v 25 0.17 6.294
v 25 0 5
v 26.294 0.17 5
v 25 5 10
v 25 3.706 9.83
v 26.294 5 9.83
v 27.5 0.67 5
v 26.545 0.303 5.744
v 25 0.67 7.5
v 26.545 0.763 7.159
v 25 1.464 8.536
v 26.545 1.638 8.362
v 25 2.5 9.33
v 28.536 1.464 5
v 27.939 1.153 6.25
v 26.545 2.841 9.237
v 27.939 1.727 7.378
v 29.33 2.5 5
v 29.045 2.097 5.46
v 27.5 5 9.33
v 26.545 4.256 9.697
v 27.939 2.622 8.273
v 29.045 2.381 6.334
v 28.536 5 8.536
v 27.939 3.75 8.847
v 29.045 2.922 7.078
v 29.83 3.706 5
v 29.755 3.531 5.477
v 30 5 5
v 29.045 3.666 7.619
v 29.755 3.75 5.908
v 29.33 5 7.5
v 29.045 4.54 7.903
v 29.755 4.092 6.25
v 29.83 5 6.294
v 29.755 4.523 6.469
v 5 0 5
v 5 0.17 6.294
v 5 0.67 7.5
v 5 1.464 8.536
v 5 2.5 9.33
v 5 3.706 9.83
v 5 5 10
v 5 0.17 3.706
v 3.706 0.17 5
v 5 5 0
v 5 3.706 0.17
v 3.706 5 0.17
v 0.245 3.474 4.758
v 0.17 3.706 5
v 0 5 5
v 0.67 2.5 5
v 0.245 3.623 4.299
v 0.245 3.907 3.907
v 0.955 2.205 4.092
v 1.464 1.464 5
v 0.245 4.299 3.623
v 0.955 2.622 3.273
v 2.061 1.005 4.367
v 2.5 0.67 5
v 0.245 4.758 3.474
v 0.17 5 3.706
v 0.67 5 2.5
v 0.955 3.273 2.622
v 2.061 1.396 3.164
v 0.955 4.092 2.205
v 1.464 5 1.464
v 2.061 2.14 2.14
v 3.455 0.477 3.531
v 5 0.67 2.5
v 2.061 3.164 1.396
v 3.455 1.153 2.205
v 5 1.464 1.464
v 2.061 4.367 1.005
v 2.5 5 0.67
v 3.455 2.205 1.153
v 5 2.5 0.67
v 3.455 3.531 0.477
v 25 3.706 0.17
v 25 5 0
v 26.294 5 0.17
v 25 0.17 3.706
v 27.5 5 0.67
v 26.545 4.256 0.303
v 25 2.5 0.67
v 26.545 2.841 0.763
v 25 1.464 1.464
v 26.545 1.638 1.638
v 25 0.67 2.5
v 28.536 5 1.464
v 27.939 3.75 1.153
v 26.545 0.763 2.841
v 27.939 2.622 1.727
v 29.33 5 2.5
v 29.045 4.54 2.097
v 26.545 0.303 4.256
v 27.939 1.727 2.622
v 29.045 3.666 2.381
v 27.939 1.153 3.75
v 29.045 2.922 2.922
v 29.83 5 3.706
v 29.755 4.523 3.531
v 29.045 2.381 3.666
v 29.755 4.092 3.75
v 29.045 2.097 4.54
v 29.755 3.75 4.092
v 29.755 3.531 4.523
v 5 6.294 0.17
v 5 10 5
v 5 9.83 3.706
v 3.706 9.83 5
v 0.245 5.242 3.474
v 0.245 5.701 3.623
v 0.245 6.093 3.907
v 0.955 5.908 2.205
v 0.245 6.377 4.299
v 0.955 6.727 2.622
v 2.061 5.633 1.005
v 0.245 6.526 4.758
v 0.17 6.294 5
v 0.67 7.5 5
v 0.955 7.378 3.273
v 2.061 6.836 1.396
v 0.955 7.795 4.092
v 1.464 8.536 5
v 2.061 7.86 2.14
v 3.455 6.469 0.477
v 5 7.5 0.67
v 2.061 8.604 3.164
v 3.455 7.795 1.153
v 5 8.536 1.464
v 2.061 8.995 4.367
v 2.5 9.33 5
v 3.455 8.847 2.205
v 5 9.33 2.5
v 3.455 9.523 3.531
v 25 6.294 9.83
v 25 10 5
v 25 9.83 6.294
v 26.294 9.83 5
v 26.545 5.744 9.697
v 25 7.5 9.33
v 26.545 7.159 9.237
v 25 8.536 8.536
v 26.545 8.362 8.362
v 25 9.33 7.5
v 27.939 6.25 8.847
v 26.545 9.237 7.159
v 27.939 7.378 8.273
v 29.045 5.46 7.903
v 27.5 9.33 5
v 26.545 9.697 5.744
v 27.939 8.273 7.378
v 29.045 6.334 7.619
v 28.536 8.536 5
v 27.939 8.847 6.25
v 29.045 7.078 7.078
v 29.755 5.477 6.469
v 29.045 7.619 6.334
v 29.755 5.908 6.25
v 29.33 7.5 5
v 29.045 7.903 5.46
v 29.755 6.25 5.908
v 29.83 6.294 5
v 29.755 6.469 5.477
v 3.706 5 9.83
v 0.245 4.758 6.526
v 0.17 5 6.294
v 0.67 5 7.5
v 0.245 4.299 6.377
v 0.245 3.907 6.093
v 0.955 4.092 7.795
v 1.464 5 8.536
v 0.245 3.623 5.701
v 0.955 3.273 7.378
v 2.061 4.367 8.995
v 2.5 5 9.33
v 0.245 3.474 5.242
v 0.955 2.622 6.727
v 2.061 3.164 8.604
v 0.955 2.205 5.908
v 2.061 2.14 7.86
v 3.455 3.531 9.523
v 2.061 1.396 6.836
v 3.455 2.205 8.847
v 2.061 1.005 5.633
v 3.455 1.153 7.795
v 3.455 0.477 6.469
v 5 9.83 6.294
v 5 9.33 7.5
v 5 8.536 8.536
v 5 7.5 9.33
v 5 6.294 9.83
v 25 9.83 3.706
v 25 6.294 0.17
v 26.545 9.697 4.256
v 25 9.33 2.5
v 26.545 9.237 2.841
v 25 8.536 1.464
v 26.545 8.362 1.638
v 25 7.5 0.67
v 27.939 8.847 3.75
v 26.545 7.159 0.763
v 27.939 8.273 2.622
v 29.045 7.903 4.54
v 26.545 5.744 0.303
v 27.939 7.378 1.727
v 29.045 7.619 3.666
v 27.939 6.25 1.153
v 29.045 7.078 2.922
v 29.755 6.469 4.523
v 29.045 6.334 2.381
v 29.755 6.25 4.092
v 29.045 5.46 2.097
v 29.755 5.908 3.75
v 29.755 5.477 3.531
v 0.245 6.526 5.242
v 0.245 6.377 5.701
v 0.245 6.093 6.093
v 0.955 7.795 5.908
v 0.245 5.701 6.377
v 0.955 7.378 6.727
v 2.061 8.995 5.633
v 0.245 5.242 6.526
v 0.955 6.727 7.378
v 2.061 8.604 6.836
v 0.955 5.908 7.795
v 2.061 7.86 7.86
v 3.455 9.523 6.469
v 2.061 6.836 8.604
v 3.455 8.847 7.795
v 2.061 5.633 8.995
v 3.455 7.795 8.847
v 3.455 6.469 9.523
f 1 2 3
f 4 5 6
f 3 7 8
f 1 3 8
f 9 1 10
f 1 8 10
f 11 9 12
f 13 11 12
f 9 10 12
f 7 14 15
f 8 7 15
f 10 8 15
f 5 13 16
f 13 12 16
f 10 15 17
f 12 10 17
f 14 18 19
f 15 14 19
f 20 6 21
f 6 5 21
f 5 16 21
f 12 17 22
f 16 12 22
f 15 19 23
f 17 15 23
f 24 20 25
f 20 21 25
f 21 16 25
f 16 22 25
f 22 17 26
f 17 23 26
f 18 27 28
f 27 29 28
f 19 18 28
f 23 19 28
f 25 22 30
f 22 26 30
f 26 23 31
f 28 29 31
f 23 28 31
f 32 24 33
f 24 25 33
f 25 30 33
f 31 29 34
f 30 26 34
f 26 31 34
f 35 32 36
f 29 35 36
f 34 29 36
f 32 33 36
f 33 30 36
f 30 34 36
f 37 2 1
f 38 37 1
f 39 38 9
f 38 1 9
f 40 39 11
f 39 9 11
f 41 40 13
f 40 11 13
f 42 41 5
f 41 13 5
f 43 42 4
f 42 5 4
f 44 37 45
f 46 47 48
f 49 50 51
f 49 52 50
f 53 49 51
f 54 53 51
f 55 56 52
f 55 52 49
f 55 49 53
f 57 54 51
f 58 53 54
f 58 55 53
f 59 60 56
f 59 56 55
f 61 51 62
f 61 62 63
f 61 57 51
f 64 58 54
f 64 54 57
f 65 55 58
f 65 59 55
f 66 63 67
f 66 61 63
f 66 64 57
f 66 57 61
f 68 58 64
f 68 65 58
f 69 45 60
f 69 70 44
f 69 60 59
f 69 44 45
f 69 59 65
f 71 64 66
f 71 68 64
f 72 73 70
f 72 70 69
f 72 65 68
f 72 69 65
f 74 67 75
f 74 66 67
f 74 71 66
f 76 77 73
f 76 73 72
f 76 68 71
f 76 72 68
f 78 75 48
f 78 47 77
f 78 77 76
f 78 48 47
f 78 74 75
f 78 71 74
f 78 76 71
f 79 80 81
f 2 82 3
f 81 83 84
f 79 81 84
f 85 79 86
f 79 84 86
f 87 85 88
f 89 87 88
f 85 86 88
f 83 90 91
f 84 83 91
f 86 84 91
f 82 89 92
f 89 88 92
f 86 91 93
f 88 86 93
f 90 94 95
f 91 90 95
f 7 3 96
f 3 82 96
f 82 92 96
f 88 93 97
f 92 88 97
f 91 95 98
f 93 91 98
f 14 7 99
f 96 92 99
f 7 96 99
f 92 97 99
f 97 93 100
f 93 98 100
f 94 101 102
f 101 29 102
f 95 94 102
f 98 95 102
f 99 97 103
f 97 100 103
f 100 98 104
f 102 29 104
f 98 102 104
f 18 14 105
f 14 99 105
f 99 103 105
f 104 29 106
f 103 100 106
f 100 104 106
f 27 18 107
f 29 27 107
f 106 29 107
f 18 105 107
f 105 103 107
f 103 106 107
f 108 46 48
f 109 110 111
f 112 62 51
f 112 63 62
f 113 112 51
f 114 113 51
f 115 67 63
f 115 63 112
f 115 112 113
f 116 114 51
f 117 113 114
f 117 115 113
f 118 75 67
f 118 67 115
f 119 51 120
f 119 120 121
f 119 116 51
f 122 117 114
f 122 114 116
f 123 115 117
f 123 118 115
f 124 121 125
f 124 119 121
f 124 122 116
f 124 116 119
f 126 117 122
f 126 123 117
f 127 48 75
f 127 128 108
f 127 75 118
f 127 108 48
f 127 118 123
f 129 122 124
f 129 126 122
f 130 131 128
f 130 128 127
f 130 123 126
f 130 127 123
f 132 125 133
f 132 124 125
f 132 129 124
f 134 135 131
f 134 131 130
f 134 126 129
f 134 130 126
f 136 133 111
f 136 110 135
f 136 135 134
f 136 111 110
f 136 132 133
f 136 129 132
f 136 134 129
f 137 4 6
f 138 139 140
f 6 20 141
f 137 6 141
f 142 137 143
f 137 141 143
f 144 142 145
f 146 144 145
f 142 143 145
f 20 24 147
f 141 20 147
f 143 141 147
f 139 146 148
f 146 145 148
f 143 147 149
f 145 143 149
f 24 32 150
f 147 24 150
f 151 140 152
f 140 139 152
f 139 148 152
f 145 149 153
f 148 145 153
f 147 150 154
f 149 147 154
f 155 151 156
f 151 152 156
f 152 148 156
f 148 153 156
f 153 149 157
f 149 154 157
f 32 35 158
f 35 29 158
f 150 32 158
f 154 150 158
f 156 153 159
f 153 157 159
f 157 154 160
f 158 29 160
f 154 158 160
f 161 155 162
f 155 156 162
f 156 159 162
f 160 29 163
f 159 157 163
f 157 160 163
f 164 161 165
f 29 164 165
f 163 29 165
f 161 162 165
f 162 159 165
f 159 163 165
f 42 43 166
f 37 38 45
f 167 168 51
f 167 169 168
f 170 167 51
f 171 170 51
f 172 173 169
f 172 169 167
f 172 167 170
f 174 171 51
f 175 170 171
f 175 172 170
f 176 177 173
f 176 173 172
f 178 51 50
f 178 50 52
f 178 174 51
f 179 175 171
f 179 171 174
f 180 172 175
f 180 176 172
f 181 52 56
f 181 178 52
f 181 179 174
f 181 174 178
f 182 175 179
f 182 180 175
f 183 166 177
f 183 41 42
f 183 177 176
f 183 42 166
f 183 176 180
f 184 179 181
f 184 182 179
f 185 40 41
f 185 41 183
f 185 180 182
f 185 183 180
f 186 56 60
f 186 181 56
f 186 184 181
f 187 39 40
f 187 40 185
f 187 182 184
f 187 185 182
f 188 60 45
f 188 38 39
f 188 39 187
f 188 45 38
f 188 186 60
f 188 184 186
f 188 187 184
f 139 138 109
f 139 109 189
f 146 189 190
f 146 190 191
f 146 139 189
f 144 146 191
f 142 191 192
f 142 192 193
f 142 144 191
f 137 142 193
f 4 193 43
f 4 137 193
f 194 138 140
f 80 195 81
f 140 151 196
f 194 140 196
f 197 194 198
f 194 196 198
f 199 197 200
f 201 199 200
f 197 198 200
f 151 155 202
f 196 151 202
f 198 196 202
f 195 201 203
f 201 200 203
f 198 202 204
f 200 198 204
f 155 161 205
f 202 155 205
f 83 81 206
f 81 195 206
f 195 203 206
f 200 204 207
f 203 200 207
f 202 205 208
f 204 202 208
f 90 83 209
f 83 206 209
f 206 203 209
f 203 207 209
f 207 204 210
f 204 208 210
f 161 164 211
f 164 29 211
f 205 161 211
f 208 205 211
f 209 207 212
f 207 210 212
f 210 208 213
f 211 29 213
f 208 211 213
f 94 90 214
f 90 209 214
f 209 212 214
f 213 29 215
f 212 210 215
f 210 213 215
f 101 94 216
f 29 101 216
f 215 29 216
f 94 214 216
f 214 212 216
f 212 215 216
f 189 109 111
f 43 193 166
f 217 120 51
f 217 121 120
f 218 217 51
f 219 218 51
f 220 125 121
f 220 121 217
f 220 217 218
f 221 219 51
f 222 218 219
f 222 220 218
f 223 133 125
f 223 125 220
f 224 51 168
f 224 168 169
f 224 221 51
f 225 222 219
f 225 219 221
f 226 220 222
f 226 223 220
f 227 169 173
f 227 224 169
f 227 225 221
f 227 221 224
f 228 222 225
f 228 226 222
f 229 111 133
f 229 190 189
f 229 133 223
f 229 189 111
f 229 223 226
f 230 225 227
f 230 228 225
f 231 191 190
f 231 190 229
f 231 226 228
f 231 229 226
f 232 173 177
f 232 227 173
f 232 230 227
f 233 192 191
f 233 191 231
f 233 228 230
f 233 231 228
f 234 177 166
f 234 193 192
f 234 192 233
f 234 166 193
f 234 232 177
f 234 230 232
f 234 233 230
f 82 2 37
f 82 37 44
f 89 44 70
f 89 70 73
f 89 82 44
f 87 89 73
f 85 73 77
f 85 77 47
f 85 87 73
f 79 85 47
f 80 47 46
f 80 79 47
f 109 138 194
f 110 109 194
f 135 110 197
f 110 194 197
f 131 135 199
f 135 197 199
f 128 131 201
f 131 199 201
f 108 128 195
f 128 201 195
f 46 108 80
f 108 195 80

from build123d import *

# Parameters (mm, degrees)
F0_W     = 30
F0_H     = 10
F1_DEPTH = 10
F2_R     = 4.99999
F3_R     = 4.99999


# Not quite as in the source:
# - a fillet or chamfer is up to 0.001 mm smaller than in the source, because OpenCascade refuses the exact size


with BuildPart() as f1:
    # F0 (on Top) → F1 (new body)
    with BuildSketch(Plane.XY):
        with Locations((15, 5)):
            Rectangle(F0_W, F0_H)
    extrude(amount=F1_DEPTH)

    # F2 (radius 5 in the source; OpenCascade refuses exactly that, so slightly less here)
    f2_edges = [f1.edges().sort_by_distance(p)[0] for p in [
        (15, 0, 10),
        (15, 0, 0),
        (15, 10, 0),
        (15, 10, 10),
    ]]
    fillet(f2_edges, radius=F2_R)

    # F3 (radius 5 in the source; OpenCascade refuses exactly that, so slightly less here)
    f3_edges = [f1.edges().sort_by_distance(p)[0] for p in [
        (30, 0, 5),
        (30, 1.464463, 1.464463),
        (30, 1.464463, 8.535537),
        (30, 5, 0),
        (30, 5, 10),
        (30, 8.535537, 1.464463),
        (30, 8.535537, 8.535537),
        (30, 10, 5),
        (0, 10, 5),
        (0, 8.535537, 1.464463),
        (0, 8.535537, 8.535537),
        (0, 5, 0),
        (0, 5, 10),
        (0, 1.464463, 1.464463),
        (0, 1.464463, 8.535537),
        (0, 0, 5),
    ]]
    fillet(f3_edges, radius=F3_R)


solid = f1.part
